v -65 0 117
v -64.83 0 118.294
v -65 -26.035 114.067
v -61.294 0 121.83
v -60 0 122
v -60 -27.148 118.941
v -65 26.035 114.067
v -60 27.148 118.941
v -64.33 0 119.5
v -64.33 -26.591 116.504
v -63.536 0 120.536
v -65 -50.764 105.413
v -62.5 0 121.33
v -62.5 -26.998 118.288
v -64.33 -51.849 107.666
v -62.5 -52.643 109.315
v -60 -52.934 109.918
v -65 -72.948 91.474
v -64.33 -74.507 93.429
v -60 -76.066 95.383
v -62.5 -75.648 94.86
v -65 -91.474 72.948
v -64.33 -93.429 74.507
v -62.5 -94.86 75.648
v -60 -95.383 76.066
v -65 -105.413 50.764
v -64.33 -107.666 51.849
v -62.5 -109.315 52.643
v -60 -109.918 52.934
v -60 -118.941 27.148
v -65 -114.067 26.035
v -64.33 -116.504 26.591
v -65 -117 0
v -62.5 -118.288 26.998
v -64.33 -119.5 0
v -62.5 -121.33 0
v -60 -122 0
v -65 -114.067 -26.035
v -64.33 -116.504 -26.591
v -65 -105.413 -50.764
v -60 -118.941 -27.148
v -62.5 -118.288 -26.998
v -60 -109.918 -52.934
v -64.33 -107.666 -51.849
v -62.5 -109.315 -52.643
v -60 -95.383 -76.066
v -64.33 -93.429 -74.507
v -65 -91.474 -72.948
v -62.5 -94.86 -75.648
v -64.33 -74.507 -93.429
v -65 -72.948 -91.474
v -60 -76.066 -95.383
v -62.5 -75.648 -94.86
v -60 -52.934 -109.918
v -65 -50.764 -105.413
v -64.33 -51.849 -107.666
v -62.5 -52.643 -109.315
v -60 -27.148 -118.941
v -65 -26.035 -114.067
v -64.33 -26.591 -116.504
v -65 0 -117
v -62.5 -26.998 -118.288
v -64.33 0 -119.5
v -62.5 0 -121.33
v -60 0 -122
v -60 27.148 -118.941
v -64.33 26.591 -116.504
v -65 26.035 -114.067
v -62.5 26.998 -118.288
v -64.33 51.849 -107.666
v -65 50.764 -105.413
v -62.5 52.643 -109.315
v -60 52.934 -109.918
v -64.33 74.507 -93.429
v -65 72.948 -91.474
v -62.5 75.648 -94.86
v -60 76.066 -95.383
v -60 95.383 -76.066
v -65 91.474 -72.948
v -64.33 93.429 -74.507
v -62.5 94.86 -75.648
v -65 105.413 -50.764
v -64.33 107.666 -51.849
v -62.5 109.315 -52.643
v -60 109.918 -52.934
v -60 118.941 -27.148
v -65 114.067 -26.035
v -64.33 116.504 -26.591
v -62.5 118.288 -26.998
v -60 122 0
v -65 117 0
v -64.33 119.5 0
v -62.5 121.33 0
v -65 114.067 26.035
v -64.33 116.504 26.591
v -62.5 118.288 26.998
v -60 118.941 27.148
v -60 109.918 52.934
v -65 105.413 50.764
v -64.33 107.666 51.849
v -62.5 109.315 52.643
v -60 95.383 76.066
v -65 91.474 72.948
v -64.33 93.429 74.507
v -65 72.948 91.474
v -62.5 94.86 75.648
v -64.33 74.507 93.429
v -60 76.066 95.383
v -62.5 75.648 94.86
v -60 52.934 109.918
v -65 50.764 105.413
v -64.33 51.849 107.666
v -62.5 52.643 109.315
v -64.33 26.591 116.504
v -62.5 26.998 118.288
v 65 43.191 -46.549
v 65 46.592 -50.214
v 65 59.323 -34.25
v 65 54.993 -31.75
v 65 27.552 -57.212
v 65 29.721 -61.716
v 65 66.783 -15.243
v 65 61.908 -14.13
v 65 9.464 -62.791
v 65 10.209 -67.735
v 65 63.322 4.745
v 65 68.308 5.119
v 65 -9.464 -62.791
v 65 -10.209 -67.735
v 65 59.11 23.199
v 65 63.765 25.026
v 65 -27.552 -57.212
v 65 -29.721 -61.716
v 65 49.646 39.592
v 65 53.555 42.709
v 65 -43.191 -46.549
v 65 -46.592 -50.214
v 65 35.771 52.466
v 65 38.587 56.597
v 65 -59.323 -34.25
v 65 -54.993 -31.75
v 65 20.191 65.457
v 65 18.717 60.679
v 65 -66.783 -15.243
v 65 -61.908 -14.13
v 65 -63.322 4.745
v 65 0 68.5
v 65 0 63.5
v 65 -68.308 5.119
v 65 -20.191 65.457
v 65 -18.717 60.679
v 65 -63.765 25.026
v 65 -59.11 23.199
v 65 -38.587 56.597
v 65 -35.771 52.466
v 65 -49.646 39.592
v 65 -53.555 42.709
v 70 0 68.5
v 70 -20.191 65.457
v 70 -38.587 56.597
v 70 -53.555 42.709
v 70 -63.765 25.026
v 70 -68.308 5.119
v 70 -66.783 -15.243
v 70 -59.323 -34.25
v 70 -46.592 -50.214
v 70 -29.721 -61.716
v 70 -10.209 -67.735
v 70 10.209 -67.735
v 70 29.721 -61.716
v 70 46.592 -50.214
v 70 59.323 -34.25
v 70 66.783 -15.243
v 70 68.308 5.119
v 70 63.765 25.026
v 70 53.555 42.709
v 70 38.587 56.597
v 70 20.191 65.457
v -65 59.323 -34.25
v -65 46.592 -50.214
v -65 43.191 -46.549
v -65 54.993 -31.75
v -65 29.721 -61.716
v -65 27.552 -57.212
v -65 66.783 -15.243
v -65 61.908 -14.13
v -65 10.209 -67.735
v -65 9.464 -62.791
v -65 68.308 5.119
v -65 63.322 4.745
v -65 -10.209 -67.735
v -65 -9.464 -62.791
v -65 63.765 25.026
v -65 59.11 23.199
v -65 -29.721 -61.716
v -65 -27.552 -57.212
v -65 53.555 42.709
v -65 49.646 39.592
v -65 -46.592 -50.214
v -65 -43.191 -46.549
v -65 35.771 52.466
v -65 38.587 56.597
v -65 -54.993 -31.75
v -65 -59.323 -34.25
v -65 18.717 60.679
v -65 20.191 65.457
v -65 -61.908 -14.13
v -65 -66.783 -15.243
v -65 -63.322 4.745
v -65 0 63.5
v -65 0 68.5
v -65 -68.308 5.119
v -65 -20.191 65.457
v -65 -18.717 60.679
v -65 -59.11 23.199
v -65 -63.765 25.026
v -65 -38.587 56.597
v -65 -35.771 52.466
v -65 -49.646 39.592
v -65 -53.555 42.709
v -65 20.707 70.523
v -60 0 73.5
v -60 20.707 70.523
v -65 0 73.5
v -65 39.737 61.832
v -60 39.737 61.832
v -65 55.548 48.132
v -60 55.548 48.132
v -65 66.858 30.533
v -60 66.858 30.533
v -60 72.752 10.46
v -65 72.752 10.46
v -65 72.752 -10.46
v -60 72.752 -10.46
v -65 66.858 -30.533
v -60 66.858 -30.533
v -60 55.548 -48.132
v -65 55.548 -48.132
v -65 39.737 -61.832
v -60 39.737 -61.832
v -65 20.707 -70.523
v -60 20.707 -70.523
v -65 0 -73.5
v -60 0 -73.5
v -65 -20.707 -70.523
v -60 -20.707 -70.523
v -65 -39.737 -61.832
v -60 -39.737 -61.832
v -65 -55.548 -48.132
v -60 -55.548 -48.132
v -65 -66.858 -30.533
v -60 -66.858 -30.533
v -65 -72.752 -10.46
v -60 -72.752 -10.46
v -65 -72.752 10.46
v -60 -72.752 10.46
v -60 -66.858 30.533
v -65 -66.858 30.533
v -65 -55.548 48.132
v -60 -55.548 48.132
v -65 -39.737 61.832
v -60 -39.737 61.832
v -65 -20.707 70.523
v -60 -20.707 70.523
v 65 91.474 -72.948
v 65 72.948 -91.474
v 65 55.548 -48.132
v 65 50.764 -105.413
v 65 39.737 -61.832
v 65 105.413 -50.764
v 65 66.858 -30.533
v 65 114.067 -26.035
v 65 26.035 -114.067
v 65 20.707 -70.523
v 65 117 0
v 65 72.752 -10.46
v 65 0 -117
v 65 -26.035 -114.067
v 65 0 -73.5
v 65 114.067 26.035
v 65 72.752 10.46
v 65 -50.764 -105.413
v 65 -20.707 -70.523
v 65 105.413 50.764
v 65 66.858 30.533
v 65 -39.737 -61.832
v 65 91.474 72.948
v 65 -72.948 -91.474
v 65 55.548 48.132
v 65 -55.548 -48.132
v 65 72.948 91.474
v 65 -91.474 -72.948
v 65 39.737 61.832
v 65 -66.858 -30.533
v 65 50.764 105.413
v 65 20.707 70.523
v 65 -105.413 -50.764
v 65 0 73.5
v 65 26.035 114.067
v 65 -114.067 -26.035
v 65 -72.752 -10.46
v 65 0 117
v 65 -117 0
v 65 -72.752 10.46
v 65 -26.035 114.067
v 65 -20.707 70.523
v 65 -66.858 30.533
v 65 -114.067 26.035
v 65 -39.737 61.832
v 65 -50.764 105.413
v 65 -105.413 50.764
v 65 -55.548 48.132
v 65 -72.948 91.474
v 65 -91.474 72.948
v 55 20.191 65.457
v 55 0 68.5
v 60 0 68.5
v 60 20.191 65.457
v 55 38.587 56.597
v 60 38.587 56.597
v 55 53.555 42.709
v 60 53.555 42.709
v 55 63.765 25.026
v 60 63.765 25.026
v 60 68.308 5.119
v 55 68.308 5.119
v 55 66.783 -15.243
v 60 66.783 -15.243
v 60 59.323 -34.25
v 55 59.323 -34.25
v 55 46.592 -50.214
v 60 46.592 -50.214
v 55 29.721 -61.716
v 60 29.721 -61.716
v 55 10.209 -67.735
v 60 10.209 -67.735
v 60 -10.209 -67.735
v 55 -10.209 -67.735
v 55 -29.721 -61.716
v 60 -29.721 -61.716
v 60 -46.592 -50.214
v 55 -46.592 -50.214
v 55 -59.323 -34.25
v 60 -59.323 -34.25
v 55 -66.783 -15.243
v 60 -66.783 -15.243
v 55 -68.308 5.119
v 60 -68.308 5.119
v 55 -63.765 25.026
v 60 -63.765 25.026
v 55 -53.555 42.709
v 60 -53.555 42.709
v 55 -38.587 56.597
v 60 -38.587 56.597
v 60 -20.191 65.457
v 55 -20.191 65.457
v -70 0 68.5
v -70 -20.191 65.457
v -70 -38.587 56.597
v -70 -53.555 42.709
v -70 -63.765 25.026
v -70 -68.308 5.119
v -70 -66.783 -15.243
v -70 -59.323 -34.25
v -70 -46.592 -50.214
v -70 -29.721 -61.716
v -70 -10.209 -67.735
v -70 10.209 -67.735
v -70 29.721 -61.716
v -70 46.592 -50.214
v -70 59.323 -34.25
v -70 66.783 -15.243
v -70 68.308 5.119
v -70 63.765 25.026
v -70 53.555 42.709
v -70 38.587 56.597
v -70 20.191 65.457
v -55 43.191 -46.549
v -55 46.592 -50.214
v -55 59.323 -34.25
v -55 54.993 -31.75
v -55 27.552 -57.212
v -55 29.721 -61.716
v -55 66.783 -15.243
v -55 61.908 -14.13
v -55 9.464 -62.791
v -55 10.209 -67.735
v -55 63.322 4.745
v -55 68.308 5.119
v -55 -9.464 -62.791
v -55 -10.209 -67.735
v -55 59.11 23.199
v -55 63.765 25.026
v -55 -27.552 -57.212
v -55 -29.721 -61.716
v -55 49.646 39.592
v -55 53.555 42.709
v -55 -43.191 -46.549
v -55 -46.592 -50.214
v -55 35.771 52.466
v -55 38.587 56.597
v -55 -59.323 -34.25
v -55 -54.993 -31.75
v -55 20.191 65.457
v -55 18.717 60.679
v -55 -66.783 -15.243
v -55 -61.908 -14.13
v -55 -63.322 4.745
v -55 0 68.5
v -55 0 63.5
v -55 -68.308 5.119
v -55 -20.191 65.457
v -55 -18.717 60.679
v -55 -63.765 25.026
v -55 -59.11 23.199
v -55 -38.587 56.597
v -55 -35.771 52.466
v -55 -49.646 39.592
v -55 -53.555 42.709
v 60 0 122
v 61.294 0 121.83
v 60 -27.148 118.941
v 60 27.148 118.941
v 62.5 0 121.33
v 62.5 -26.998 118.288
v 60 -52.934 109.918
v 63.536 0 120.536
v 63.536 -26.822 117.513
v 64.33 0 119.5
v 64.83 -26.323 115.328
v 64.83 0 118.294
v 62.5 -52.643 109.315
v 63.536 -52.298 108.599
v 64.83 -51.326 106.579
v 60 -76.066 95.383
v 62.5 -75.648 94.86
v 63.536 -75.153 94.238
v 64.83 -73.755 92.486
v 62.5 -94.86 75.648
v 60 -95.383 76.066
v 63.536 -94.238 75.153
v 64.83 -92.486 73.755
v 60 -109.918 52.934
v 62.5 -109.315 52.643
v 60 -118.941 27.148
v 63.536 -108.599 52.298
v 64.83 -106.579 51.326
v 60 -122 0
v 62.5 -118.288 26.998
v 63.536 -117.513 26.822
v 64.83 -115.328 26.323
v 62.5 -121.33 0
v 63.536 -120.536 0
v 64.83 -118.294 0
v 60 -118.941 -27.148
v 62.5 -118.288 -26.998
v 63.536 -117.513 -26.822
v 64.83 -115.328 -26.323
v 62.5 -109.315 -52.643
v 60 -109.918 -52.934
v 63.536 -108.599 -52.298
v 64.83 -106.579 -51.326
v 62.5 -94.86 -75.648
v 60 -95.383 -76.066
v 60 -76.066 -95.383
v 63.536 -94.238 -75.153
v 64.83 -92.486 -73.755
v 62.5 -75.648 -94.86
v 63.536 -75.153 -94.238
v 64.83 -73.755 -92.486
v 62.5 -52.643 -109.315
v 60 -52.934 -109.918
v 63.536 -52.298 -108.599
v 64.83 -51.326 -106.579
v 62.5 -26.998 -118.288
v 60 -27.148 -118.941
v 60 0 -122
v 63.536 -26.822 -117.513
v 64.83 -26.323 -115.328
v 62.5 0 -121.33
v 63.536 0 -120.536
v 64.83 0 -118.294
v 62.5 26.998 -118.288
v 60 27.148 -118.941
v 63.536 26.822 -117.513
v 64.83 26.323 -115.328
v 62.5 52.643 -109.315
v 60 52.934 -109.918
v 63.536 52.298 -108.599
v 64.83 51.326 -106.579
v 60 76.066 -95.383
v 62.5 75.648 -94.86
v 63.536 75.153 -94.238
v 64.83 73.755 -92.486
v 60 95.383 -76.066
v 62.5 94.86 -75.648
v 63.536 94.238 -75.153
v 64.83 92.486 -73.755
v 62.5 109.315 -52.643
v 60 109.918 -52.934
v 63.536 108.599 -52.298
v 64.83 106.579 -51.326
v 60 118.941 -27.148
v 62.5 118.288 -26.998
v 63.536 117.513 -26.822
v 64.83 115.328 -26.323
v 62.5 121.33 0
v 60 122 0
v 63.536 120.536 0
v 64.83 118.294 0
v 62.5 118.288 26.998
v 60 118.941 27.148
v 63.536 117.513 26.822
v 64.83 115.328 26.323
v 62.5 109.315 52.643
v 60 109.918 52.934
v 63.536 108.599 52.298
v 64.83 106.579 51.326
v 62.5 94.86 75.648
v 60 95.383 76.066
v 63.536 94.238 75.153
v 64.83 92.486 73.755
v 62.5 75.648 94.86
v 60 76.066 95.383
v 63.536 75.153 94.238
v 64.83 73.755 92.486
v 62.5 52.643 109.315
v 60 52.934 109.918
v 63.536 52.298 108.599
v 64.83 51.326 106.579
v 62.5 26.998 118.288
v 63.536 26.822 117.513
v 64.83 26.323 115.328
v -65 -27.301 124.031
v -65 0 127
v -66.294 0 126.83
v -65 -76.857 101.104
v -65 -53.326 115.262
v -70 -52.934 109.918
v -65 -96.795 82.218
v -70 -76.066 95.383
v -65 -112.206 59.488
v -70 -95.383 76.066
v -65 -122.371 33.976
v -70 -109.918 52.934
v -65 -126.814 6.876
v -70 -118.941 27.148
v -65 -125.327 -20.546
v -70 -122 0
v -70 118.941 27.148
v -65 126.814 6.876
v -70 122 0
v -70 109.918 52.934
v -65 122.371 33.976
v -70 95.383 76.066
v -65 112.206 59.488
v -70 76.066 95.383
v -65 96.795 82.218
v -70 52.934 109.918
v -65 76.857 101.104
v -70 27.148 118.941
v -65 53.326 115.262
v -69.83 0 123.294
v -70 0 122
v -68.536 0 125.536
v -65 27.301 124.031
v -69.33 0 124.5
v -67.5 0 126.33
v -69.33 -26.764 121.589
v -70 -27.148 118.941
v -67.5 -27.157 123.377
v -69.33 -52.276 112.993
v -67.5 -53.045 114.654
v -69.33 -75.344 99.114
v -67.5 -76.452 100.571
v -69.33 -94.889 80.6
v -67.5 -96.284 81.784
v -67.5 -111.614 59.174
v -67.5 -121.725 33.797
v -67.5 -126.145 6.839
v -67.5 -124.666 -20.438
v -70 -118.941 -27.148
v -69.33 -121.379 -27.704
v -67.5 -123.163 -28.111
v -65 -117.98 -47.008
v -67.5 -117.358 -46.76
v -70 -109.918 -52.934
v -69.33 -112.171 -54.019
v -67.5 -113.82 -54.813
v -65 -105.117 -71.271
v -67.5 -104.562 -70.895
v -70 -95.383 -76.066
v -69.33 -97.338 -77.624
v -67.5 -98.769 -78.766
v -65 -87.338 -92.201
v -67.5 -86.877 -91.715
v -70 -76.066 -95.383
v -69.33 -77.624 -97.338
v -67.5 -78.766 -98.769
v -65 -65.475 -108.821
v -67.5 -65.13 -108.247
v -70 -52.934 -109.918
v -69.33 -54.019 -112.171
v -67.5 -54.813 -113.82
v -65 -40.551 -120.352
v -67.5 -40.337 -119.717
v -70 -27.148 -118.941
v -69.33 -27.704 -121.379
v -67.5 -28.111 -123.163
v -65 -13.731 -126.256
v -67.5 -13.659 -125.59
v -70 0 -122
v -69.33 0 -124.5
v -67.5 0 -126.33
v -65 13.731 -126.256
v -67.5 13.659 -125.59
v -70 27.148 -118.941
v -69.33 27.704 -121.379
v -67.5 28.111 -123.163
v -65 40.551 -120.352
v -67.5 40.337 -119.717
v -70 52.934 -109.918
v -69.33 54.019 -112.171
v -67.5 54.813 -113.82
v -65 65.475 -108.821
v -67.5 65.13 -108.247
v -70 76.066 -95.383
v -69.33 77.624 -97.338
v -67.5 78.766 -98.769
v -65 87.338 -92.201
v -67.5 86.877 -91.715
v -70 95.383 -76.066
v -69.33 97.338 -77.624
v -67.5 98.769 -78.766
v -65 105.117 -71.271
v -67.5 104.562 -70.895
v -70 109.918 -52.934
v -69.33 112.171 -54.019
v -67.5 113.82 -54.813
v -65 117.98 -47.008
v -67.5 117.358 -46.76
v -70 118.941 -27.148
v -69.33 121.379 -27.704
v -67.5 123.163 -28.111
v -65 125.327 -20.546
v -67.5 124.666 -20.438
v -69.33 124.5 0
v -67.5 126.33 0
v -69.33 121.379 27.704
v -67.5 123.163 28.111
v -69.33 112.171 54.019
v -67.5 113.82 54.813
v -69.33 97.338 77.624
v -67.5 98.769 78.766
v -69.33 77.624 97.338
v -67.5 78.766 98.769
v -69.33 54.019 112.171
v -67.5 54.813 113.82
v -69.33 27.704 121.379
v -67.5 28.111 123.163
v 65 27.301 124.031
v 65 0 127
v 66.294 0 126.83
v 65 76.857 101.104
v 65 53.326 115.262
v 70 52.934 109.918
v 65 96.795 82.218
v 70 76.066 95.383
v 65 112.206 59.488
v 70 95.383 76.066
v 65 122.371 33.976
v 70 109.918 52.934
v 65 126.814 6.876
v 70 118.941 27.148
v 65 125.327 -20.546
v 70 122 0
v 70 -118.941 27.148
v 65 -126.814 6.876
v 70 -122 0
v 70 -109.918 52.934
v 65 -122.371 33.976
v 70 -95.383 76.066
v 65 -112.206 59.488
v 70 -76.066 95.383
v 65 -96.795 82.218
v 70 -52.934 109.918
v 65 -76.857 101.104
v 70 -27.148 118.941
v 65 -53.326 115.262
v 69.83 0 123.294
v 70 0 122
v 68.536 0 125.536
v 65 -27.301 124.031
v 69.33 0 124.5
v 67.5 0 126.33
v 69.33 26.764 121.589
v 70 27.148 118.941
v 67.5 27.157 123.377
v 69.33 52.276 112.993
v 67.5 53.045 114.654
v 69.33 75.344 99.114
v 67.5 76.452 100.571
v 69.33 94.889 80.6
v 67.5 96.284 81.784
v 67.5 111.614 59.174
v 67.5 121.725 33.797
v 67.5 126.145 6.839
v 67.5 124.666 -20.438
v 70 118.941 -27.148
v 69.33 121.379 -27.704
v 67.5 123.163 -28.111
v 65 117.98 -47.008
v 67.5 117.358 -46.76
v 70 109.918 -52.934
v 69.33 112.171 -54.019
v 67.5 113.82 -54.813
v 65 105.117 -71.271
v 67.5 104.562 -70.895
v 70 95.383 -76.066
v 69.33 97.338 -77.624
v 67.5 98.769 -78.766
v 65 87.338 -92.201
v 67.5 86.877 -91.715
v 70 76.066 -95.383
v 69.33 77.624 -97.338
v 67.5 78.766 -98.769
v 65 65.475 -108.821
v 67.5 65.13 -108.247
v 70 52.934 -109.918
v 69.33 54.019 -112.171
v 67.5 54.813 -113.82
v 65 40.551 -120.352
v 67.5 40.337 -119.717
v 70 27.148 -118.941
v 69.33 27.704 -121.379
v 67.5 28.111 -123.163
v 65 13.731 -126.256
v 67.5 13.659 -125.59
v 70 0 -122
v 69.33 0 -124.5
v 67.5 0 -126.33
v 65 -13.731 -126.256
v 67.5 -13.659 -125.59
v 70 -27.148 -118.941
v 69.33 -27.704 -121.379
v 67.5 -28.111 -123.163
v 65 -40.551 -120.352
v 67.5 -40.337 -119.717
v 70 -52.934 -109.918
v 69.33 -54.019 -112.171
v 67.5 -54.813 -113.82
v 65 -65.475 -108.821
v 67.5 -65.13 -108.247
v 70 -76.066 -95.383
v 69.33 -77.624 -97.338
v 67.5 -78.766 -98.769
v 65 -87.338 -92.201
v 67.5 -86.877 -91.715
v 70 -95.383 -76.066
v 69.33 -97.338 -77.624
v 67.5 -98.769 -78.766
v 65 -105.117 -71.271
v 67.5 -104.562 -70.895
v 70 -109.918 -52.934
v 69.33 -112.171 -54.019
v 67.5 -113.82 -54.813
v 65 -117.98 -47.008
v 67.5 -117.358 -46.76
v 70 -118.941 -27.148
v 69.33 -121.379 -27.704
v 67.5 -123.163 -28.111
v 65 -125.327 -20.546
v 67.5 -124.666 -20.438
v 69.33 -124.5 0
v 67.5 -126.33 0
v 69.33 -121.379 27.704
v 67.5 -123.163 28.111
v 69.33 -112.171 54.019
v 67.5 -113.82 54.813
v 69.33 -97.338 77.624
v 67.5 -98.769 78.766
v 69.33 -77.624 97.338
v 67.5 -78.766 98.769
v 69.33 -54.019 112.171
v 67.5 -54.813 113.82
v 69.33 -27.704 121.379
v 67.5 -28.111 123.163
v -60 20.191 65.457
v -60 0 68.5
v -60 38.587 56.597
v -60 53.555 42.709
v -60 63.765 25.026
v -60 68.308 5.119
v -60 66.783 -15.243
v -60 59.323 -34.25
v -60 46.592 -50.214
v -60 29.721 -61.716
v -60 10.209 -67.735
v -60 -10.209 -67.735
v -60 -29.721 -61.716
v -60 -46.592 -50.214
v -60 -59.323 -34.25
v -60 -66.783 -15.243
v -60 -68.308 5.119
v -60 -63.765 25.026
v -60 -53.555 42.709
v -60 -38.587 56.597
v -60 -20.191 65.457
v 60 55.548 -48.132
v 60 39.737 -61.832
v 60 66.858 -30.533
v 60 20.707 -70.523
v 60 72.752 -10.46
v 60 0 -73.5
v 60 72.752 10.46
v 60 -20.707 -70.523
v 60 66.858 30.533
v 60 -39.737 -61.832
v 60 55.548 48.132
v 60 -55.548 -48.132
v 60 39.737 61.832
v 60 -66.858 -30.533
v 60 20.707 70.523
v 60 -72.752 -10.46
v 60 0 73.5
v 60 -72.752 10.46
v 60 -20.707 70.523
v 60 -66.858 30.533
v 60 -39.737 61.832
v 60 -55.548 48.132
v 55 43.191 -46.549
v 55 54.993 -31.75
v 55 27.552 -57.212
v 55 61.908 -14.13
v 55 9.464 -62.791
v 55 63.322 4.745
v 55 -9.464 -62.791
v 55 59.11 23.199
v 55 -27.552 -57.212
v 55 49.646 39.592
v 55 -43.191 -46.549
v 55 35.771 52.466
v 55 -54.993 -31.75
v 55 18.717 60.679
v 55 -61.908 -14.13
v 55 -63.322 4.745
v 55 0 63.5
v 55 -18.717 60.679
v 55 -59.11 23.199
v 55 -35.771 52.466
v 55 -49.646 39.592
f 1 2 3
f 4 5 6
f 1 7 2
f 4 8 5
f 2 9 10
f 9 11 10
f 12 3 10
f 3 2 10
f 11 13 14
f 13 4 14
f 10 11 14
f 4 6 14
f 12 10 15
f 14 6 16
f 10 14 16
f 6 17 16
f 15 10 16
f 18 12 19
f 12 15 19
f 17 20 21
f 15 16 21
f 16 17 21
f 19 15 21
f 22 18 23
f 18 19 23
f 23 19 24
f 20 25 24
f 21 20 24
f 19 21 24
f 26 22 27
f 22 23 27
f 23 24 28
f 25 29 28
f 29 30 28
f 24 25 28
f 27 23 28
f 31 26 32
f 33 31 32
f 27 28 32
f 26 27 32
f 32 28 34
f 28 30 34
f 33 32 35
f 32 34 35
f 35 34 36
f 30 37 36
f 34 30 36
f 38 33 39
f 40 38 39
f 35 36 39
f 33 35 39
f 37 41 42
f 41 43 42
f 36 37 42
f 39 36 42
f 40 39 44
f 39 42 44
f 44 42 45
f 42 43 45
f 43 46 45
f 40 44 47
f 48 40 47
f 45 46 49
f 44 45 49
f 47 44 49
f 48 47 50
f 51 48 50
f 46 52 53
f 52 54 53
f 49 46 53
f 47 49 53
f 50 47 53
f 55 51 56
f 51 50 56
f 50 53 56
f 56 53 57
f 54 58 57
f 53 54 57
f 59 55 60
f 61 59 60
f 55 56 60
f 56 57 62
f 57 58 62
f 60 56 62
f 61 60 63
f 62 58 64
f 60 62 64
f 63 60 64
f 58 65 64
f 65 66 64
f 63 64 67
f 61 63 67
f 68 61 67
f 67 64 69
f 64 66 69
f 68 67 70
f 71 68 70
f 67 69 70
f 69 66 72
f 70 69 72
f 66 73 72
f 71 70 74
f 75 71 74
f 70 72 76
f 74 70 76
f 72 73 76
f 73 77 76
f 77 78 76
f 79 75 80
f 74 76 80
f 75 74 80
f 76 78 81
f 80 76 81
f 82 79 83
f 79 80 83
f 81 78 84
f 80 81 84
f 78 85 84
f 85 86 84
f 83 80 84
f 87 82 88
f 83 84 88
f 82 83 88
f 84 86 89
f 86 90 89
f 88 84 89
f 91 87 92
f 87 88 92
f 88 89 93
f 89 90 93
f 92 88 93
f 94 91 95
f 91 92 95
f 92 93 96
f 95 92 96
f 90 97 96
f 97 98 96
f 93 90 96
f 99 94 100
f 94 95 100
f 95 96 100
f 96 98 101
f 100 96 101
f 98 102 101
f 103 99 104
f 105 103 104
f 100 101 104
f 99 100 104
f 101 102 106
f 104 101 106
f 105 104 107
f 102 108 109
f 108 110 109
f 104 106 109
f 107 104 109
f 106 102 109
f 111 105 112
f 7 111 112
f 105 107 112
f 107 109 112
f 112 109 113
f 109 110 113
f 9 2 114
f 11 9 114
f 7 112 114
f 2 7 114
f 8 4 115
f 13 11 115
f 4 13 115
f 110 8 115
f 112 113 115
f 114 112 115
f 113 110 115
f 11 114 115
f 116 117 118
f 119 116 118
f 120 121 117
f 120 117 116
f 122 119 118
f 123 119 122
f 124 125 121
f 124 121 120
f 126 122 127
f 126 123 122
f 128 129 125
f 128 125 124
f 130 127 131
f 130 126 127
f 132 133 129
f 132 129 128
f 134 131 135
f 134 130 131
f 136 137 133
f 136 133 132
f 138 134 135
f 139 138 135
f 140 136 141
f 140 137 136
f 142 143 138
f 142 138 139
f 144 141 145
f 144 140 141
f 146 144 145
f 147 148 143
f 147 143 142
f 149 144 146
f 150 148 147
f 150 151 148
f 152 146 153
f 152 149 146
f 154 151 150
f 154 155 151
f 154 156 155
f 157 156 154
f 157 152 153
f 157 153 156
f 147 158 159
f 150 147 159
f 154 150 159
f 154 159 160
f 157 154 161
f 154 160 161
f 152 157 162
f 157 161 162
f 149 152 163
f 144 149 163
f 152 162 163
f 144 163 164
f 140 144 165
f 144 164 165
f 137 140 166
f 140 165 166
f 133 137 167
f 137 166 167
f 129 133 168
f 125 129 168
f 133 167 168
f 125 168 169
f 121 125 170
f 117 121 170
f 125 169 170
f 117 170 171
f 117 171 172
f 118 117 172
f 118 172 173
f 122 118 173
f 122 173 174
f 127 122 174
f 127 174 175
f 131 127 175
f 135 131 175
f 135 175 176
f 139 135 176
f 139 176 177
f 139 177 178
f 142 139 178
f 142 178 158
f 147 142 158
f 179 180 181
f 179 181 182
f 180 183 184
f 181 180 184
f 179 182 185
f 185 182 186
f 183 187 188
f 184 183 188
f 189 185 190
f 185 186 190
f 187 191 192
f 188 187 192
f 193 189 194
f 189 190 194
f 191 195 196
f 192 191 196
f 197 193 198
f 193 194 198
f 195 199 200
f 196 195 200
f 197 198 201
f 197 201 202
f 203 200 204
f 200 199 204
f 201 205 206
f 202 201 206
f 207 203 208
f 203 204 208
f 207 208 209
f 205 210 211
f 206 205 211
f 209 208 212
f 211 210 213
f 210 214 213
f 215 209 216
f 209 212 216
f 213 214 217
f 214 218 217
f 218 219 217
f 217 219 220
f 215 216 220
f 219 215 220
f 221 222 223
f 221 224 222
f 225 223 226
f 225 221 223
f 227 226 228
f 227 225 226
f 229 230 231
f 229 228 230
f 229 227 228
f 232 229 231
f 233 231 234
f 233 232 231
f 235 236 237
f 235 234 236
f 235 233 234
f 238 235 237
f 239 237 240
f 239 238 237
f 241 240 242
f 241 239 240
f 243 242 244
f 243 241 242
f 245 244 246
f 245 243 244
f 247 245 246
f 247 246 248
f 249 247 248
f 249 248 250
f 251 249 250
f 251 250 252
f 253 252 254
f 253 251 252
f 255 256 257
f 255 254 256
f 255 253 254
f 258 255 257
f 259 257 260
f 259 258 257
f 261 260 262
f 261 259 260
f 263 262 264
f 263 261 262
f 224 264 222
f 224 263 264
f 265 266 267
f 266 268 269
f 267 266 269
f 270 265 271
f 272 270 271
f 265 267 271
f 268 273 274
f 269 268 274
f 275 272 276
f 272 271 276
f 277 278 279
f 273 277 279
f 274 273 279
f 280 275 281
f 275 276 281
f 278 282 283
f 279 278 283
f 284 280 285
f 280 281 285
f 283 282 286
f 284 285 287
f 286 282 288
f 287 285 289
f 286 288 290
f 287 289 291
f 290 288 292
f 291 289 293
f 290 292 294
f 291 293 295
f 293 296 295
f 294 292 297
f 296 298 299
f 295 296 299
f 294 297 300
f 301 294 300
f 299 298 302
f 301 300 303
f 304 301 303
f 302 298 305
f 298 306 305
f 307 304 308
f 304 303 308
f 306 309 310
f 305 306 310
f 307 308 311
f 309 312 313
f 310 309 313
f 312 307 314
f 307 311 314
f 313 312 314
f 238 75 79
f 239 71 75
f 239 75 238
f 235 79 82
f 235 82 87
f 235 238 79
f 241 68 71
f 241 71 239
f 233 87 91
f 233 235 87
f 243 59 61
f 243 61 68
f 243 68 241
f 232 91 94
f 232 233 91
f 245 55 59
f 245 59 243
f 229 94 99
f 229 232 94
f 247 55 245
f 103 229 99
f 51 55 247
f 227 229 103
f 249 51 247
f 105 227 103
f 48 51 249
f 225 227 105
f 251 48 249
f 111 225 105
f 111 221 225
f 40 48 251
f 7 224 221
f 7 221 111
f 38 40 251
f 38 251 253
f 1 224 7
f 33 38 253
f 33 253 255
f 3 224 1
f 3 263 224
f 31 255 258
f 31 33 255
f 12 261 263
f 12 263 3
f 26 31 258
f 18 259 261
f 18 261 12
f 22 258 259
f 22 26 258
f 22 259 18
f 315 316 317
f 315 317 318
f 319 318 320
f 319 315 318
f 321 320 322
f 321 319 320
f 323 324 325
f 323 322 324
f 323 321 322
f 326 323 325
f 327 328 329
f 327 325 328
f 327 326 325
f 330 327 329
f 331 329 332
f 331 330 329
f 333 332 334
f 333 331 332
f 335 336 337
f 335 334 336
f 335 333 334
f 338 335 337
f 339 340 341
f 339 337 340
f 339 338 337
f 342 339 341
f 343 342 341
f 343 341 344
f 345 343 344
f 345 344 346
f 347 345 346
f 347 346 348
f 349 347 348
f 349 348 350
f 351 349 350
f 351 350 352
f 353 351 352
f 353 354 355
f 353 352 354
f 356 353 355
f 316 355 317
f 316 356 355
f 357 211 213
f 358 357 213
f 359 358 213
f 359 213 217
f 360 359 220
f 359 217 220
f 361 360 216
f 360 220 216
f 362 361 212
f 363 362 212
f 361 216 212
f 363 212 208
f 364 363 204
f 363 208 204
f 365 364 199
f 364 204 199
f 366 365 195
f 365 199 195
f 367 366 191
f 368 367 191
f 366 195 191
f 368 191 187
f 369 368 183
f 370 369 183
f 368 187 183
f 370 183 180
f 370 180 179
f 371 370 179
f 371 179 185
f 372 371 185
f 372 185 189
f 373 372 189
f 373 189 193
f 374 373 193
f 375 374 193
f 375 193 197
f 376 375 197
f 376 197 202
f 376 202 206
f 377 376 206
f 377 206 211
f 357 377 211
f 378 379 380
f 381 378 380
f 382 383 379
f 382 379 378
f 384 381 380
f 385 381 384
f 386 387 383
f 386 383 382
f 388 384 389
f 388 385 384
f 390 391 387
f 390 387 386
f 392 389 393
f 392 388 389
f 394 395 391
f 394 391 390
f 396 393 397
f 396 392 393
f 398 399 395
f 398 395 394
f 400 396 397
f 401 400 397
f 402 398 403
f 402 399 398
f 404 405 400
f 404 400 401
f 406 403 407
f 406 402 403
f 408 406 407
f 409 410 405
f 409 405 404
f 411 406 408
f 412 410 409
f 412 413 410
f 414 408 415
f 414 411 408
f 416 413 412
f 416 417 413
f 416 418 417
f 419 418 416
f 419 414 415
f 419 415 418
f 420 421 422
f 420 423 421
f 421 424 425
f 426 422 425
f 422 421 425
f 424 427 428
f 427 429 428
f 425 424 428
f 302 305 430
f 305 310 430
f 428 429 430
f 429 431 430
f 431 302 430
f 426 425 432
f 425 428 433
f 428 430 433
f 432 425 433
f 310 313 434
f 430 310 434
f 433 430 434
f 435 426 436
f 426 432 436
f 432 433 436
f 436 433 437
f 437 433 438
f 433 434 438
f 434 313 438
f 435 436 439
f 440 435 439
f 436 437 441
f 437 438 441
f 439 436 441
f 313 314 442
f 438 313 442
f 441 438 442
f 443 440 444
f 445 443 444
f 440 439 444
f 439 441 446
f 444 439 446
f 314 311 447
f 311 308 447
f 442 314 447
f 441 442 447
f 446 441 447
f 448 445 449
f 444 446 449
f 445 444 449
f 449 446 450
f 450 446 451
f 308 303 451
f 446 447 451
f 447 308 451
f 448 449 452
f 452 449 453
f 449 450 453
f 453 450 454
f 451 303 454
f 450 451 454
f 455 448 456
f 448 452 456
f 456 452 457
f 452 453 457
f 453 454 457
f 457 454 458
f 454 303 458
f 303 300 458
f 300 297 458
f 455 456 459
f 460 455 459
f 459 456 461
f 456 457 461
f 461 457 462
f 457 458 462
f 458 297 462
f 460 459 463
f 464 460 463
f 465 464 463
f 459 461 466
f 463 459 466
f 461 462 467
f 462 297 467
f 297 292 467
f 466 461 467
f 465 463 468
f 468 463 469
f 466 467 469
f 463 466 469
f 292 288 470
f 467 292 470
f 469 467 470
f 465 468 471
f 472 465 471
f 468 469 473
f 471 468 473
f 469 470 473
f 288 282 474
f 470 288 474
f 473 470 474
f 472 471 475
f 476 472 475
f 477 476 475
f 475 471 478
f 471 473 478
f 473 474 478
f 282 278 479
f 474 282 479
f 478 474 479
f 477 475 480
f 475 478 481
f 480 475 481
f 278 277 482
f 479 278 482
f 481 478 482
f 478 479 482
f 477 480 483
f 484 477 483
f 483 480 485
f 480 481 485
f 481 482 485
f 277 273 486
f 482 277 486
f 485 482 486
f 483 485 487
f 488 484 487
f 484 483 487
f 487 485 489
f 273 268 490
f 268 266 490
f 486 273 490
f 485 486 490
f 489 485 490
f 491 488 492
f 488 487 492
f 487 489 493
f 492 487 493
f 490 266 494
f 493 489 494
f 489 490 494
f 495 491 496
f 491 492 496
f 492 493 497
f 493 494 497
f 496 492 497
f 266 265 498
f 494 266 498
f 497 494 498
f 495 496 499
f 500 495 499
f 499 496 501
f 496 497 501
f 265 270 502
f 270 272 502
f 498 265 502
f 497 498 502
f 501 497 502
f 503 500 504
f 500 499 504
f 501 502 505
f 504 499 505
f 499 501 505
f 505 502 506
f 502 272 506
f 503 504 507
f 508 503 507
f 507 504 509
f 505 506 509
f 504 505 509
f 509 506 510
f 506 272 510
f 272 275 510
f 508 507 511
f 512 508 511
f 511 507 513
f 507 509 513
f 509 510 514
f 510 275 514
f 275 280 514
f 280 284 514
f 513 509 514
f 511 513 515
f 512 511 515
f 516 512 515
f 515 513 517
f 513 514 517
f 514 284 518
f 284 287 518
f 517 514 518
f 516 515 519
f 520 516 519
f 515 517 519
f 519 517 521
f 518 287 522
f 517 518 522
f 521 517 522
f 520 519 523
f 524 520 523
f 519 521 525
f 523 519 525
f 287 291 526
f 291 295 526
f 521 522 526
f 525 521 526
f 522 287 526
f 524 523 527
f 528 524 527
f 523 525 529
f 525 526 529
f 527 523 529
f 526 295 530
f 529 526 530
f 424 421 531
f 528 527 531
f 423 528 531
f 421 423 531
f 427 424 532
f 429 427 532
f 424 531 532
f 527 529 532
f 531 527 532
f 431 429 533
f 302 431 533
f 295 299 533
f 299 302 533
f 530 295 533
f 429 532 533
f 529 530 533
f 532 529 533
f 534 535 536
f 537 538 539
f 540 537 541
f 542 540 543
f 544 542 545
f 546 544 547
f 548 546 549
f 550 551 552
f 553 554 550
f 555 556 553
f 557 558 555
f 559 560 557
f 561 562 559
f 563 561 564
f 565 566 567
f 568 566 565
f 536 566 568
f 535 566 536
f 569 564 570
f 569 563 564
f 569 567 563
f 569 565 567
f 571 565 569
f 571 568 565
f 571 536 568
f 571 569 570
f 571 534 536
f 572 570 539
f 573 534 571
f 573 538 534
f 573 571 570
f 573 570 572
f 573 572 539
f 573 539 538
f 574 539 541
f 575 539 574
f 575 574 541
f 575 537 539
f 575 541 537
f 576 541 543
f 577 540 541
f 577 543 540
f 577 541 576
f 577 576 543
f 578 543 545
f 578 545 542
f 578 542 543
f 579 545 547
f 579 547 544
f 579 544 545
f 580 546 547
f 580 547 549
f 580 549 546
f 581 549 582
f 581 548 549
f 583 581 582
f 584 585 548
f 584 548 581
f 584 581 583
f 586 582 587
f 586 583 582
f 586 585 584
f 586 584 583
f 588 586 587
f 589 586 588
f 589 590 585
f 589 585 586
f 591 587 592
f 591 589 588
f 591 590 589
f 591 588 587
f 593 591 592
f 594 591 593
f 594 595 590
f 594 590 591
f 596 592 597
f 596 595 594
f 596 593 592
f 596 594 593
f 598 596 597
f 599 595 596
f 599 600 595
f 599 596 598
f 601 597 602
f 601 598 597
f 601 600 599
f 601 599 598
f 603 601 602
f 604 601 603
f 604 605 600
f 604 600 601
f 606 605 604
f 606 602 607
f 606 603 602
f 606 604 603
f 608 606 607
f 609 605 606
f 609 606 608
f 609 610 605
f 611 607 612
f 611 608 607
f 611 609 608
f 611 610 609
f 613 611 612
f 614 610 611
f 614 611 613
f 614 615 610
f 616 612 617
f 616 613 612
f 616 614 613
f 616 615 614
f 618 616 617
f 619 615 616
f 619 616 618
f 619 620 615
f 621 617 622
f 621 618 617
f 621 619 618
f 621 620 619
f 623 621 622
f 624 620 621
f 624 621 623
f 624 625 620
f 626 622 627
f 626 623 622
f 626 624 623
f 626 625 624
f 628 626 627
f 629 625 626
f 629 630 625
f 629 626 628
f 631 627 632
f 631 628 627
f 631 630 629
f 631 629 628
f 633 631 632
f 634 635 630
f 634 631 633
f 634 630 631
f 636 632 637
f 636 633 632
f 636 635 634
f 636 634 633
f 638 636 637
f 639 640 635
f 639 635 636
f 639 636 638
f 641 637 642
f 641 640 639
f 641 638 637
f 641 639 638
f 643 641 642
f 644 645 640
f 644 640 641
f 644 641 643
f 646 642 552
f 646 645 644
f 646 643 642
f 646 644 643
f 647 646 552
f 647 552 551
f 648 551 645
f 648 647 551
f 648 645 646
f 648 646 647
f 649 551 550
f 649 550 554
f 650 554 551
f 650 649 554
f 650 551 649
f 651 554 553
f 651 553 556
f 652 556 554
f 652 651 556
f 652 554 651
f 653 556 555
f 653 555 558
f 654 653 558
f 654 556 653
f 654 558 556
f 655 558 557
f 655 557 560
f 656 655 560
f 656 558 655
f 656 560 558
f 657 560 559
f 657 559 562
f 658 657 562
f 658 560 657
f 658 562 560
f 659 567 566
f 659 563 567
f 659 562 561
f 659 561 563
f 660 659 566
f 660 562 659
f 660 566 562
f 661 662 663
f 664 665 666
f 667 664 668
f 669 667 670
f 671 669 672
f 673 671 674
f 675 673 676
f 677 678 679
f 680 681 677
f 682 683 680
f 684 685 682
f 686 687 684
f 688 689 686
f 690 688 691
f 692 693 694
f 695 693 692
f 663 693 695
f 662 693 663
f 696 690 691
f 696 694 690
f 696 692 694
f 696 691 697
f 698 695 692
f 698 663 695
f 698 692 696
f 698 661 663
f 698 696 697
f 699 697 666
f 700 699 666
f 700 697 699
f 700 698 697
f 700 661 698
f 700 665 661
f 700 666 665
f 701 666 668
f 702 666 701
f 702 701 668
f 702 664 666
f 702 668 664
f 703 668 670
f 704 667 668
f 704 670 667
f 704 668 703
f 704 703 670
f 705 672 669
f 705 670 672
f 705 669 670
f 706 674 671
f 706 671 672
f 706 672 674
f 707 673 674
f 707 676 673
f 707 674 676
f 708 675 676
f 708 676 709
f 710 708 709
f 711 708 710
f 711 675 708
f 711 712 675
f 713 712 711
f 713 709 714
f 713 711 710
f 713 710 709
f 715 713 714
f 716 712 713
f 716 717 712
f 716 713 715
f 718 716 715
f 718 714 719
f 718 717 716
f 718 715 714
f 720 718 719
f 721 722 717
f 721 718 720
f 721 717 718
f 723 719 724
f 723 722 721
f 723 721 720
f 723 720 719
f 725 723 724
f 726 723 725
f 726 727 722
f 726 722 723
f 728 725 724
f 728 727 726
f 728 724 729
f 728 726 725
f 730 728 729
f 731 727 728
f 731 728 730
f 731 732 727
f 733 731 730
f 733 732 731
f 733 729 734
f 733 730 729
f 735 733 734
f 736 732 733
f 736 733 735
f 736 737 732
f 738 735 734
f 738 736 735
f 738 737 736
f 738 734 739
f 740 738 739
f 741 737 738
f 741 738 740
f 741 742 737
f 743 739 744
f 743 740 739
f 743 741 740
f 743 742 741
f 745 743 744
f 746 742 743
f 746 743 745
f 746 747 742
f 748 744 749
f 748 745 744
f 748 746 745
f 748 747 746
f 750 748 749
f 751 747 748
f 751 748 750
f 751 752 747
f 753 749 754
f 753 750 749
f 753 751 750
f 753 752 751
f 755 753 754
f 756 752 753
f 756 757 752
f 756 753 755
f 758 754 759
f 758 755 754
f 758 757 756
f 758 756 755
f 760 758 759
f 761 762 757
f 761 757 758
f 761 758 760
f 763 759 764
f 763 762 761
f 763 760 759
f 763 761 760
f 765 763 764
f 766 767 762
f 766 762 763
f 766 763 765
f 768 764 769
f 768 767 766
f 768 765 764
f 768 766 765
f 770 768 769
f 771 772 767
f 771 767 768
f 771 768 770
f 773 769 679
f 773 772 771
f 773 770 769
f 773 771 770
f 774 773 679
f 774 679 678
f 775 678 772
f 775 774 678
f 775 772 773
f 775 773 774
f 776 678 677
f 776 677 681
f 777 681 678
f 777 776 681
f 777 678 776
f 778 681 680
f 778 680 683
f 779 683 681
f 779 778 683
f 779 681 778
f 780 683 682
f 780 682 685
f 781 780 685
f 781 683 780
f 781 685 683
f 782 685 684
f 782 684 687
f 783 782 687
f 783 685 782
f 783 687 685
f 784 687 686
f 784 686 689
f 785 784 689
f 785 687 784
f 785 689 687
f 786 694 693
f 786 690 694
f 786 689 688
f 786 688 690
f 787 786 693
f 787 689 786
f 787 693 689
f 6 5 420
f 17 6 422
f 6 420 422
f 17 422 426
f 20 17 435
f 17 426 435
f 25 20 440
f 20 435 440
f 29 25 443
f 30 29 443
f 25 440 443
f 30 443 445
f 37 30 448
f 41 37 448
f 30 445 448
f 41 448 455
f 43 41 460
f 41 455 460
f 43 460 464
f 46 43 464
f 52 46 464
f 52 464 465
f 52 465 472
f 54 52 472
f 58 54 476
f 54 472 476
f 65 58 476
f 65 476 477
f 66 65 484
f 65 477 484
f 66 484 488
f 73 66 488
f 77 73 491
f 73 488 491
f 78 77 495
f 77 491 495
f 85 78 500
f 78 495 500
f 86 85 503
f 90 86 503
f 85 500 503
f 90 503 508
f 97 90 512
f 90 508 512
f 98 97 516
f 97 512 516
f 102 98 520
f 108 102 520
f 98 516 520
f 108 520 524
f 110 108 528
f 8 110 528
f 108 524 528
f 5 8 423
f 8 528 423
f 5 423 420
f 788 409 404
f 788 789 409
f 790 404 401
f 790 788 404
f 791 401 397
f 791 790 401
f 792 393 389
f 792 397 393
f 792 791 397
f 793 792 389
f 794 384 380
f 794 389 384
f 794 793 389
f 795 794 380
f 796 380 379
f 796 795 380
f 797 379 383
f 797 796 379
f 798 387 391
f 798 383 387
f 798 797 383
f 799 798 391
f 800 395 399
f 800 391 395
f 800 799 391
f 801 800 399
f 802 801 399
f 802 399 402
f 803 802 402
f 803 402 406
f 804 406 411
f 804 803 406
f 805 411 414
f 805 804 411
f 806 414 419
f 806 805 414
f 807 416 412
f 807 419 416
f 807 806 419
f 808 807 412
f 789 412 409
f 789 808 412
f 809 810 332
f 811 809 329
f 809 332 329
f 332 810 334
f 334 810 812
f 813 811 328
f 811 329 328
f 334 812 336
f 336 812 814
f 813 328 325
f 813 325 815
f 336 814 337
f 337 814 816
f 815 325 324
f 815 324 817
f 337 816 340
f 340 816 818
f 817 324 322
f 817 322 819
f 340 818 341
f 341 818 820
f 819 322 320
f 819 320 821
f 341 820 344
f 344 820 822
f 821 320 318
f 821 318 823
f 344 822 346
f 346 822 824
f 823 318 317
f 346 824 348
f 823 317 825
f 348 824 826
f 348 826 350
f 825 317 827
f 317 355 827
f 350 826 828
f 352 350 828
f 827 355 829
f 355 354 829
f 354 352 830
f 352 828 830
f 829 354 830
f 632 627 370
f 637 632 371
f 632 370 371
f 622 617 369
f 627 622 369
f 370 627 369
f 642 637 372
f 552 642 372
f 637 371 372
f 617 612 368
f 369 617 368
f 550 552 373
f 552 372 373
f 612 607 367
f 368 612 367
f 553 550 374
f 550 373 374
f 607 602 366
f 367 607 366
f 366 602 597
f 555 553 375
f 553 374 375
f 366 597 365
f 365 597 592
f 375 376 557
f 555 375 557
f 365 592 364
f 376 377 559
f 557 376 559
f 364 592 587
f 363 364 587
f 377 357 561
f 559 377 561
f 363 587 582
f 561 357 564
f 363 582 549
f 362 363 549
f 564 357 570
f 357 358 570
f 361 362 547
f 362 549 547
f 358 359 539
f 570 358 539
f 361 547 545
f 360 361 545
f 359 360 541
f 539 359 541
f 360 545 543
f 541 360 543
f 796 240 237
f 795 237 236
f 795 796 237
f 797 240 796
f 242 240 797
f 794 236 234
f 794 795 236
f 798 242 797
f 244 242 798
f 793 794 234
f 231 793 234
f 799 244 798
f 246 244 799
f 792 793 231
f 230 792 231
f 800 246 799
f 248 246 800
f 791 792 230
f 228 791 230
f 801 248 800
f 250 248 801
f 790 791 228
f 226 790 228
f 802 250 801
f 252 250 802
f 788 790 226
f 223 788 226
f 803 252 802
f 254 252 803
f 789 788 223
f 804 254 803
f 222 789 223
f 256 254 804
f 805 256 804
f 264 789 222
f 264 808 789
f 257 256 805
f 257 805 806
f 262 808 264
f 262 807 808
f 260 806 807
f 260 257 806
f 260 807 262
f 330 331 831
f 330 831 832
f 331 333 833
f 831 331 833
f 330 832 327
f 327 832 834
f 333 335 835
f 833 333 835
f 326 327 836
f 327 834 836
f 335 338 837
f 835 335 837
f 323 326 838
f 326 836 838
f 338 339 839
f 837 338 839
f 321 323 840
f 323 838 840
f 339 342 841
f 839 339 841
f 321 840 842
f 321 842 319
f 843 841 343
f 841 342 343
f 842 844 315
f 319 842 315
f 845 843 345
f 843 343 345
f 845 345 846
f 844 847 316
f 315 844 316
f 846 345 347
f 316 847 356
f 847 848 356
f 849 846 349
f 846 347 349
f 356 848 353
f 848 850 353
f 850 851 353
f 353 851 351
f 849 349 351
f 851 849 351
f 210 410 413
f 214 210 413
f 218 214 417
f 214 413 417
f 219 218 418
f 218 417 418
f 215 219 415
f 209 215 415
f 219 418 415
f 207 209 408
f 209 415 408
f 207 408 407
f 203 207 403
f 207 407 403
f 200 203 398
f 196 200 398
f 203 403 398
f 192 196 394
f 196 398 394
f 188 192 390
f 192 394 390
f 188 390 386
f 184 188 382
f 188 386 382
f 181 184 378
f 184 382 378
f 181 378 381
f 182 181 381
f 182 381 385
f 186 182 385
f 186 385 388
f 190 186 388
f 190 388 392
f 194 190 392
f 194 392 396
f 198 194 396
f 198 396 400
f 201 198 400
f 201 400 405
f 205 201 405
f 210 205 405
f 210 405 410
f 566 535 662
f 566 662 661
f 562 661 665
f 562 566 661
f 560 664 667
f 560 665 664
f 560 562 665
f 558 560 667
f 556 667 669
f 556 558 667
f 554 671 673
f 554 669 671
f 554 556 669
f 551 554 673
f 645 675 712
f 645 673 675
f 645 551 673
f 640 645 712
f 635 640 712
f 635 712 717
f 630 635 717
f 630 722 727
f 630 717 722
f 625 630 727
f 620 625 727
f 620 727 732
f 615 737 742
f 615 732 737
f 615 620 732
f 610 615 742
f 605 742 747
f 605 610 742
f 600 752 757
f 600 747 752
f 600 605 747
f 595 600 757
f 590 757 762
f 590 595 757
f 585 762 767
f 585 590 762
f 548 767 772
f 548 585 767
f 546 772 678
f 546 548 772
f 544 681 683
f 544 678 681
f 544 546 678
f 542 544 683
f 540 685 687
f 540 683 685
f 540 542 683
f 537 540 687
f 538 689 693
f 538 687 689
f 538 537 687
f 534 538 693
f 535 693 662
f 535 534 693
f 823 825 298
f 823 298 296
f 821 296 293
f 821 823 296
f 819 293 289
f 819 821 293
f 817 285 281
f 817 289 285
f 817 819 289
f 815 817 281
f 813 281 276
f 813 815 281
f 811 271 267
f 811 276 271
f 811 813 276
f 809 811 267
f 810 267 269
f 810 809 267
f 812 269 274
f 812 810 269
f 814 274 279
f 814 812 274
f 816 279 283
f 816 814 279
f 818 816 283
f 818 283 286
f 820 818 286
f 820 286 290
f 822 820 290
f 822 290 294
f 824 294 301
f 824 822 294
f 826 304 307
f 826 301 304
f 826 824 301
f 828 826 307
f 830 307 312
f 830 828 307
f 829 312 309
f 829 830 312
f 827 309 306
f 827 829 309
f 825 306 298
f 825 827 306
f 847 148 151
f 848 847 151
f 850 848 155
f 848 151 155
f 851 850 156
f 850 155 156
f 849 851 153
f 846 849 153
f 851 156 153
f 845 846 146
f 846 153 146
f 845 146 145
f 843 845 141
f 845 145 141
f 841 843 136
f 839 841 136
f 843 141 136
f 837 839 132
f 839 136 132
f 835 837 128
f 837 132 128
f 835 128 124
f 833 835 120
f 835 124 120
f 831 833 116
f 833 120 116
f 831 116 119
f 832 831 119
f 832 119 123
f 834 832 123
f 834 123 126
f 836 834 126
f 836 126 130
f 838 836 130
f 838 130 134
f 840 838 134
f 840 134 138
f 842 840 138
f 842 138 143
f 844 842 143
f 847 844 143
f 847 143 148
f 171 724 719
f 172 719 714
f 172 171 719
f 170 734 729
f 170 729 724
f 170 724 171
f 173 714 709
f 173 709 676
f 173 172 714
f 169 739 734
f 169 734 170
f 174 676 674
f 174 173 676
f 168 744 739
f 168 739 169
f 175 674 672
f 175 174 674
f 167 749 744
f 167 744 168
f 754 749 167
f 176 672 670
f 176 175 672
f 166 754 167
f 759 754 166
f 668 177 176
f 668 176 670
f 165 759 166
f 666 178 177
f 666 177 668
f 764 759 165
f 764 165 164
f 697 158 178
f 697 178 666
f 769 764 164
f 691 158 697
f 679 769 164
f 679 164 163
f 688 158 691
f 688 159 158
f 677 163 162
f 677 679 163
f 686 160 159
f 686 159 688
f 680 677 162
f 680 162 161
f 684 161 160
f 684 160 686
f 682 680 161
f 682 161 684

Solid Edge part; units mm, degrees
sketch "Sketch1" plane through (0, 0, 0) normal (0, -1, 0) x (1, 0, 0)
  line L0 (-70, 127) -> (-70, 68.5)
  line L1 (-70, 68.5) -> (-65, 68.5)
  line L2 (-65, 68.5) -> (-65, 63.5)
  line L3 (-65, 63.5) -> (-55, 63.5)
  line L4 (-55, 63.5) -> (-55, 68.5)
  line L5 (-55, 68.5) -> (-60, 68.5)
  line L6 (-60, 68.5) -> (-60, 73.5)
  line L7 (-60, 73.5) -> (-65, 73.5)
  line L8 (-65, 73.5) -> (-65, 122)
  line L9 (-65, 122) -> (65, 122)
  line L10 (65, 122) -> (65, 73.5)
  line L11 (65, 73.5) -> (60, 73.5)
  line L12 (60, 73.5) -> (60, 68.5)
  line L13 (60, 68.5) -> (55, 68.5)
  line L14 (55, 68.5) -> (55, 63.5)
  line L15 (55, 63.5) -> (65, 63.5)
  line L16 (65, 63.5) -> (65, 68.5)
  line L17 (65, 68.5) -> (70, 68.5)
  line L18 (70, 68.5) -> (70, 127)
  line L19 (70, 127) -> (-70, 127)
  dimension "D1" = 130
  dimension "D2" = 10
  dimension "D3" = 5
  dimension "D4" = 5
  dimension "D5" = 5
  dimension "D6" = 5
  dimension "D7" = 10
  dimension "D8" = 5
  dimension "D9" = 5
  dimension "D10" = 5
  dimension "D11" = 5
  dimension "D12" = 5
revolve "RevolvedProtrusion1" add sketch "Sketch1" angle 360 about axis through (-79.3986, 0, 0) along (1, 0, 0)
fillet "Round1" radius 5 4 edges at (-65, 0, -122) (-70, 0, -127) (65, 0, -122) (70, 0, -127)
properties material "Phenolic"
